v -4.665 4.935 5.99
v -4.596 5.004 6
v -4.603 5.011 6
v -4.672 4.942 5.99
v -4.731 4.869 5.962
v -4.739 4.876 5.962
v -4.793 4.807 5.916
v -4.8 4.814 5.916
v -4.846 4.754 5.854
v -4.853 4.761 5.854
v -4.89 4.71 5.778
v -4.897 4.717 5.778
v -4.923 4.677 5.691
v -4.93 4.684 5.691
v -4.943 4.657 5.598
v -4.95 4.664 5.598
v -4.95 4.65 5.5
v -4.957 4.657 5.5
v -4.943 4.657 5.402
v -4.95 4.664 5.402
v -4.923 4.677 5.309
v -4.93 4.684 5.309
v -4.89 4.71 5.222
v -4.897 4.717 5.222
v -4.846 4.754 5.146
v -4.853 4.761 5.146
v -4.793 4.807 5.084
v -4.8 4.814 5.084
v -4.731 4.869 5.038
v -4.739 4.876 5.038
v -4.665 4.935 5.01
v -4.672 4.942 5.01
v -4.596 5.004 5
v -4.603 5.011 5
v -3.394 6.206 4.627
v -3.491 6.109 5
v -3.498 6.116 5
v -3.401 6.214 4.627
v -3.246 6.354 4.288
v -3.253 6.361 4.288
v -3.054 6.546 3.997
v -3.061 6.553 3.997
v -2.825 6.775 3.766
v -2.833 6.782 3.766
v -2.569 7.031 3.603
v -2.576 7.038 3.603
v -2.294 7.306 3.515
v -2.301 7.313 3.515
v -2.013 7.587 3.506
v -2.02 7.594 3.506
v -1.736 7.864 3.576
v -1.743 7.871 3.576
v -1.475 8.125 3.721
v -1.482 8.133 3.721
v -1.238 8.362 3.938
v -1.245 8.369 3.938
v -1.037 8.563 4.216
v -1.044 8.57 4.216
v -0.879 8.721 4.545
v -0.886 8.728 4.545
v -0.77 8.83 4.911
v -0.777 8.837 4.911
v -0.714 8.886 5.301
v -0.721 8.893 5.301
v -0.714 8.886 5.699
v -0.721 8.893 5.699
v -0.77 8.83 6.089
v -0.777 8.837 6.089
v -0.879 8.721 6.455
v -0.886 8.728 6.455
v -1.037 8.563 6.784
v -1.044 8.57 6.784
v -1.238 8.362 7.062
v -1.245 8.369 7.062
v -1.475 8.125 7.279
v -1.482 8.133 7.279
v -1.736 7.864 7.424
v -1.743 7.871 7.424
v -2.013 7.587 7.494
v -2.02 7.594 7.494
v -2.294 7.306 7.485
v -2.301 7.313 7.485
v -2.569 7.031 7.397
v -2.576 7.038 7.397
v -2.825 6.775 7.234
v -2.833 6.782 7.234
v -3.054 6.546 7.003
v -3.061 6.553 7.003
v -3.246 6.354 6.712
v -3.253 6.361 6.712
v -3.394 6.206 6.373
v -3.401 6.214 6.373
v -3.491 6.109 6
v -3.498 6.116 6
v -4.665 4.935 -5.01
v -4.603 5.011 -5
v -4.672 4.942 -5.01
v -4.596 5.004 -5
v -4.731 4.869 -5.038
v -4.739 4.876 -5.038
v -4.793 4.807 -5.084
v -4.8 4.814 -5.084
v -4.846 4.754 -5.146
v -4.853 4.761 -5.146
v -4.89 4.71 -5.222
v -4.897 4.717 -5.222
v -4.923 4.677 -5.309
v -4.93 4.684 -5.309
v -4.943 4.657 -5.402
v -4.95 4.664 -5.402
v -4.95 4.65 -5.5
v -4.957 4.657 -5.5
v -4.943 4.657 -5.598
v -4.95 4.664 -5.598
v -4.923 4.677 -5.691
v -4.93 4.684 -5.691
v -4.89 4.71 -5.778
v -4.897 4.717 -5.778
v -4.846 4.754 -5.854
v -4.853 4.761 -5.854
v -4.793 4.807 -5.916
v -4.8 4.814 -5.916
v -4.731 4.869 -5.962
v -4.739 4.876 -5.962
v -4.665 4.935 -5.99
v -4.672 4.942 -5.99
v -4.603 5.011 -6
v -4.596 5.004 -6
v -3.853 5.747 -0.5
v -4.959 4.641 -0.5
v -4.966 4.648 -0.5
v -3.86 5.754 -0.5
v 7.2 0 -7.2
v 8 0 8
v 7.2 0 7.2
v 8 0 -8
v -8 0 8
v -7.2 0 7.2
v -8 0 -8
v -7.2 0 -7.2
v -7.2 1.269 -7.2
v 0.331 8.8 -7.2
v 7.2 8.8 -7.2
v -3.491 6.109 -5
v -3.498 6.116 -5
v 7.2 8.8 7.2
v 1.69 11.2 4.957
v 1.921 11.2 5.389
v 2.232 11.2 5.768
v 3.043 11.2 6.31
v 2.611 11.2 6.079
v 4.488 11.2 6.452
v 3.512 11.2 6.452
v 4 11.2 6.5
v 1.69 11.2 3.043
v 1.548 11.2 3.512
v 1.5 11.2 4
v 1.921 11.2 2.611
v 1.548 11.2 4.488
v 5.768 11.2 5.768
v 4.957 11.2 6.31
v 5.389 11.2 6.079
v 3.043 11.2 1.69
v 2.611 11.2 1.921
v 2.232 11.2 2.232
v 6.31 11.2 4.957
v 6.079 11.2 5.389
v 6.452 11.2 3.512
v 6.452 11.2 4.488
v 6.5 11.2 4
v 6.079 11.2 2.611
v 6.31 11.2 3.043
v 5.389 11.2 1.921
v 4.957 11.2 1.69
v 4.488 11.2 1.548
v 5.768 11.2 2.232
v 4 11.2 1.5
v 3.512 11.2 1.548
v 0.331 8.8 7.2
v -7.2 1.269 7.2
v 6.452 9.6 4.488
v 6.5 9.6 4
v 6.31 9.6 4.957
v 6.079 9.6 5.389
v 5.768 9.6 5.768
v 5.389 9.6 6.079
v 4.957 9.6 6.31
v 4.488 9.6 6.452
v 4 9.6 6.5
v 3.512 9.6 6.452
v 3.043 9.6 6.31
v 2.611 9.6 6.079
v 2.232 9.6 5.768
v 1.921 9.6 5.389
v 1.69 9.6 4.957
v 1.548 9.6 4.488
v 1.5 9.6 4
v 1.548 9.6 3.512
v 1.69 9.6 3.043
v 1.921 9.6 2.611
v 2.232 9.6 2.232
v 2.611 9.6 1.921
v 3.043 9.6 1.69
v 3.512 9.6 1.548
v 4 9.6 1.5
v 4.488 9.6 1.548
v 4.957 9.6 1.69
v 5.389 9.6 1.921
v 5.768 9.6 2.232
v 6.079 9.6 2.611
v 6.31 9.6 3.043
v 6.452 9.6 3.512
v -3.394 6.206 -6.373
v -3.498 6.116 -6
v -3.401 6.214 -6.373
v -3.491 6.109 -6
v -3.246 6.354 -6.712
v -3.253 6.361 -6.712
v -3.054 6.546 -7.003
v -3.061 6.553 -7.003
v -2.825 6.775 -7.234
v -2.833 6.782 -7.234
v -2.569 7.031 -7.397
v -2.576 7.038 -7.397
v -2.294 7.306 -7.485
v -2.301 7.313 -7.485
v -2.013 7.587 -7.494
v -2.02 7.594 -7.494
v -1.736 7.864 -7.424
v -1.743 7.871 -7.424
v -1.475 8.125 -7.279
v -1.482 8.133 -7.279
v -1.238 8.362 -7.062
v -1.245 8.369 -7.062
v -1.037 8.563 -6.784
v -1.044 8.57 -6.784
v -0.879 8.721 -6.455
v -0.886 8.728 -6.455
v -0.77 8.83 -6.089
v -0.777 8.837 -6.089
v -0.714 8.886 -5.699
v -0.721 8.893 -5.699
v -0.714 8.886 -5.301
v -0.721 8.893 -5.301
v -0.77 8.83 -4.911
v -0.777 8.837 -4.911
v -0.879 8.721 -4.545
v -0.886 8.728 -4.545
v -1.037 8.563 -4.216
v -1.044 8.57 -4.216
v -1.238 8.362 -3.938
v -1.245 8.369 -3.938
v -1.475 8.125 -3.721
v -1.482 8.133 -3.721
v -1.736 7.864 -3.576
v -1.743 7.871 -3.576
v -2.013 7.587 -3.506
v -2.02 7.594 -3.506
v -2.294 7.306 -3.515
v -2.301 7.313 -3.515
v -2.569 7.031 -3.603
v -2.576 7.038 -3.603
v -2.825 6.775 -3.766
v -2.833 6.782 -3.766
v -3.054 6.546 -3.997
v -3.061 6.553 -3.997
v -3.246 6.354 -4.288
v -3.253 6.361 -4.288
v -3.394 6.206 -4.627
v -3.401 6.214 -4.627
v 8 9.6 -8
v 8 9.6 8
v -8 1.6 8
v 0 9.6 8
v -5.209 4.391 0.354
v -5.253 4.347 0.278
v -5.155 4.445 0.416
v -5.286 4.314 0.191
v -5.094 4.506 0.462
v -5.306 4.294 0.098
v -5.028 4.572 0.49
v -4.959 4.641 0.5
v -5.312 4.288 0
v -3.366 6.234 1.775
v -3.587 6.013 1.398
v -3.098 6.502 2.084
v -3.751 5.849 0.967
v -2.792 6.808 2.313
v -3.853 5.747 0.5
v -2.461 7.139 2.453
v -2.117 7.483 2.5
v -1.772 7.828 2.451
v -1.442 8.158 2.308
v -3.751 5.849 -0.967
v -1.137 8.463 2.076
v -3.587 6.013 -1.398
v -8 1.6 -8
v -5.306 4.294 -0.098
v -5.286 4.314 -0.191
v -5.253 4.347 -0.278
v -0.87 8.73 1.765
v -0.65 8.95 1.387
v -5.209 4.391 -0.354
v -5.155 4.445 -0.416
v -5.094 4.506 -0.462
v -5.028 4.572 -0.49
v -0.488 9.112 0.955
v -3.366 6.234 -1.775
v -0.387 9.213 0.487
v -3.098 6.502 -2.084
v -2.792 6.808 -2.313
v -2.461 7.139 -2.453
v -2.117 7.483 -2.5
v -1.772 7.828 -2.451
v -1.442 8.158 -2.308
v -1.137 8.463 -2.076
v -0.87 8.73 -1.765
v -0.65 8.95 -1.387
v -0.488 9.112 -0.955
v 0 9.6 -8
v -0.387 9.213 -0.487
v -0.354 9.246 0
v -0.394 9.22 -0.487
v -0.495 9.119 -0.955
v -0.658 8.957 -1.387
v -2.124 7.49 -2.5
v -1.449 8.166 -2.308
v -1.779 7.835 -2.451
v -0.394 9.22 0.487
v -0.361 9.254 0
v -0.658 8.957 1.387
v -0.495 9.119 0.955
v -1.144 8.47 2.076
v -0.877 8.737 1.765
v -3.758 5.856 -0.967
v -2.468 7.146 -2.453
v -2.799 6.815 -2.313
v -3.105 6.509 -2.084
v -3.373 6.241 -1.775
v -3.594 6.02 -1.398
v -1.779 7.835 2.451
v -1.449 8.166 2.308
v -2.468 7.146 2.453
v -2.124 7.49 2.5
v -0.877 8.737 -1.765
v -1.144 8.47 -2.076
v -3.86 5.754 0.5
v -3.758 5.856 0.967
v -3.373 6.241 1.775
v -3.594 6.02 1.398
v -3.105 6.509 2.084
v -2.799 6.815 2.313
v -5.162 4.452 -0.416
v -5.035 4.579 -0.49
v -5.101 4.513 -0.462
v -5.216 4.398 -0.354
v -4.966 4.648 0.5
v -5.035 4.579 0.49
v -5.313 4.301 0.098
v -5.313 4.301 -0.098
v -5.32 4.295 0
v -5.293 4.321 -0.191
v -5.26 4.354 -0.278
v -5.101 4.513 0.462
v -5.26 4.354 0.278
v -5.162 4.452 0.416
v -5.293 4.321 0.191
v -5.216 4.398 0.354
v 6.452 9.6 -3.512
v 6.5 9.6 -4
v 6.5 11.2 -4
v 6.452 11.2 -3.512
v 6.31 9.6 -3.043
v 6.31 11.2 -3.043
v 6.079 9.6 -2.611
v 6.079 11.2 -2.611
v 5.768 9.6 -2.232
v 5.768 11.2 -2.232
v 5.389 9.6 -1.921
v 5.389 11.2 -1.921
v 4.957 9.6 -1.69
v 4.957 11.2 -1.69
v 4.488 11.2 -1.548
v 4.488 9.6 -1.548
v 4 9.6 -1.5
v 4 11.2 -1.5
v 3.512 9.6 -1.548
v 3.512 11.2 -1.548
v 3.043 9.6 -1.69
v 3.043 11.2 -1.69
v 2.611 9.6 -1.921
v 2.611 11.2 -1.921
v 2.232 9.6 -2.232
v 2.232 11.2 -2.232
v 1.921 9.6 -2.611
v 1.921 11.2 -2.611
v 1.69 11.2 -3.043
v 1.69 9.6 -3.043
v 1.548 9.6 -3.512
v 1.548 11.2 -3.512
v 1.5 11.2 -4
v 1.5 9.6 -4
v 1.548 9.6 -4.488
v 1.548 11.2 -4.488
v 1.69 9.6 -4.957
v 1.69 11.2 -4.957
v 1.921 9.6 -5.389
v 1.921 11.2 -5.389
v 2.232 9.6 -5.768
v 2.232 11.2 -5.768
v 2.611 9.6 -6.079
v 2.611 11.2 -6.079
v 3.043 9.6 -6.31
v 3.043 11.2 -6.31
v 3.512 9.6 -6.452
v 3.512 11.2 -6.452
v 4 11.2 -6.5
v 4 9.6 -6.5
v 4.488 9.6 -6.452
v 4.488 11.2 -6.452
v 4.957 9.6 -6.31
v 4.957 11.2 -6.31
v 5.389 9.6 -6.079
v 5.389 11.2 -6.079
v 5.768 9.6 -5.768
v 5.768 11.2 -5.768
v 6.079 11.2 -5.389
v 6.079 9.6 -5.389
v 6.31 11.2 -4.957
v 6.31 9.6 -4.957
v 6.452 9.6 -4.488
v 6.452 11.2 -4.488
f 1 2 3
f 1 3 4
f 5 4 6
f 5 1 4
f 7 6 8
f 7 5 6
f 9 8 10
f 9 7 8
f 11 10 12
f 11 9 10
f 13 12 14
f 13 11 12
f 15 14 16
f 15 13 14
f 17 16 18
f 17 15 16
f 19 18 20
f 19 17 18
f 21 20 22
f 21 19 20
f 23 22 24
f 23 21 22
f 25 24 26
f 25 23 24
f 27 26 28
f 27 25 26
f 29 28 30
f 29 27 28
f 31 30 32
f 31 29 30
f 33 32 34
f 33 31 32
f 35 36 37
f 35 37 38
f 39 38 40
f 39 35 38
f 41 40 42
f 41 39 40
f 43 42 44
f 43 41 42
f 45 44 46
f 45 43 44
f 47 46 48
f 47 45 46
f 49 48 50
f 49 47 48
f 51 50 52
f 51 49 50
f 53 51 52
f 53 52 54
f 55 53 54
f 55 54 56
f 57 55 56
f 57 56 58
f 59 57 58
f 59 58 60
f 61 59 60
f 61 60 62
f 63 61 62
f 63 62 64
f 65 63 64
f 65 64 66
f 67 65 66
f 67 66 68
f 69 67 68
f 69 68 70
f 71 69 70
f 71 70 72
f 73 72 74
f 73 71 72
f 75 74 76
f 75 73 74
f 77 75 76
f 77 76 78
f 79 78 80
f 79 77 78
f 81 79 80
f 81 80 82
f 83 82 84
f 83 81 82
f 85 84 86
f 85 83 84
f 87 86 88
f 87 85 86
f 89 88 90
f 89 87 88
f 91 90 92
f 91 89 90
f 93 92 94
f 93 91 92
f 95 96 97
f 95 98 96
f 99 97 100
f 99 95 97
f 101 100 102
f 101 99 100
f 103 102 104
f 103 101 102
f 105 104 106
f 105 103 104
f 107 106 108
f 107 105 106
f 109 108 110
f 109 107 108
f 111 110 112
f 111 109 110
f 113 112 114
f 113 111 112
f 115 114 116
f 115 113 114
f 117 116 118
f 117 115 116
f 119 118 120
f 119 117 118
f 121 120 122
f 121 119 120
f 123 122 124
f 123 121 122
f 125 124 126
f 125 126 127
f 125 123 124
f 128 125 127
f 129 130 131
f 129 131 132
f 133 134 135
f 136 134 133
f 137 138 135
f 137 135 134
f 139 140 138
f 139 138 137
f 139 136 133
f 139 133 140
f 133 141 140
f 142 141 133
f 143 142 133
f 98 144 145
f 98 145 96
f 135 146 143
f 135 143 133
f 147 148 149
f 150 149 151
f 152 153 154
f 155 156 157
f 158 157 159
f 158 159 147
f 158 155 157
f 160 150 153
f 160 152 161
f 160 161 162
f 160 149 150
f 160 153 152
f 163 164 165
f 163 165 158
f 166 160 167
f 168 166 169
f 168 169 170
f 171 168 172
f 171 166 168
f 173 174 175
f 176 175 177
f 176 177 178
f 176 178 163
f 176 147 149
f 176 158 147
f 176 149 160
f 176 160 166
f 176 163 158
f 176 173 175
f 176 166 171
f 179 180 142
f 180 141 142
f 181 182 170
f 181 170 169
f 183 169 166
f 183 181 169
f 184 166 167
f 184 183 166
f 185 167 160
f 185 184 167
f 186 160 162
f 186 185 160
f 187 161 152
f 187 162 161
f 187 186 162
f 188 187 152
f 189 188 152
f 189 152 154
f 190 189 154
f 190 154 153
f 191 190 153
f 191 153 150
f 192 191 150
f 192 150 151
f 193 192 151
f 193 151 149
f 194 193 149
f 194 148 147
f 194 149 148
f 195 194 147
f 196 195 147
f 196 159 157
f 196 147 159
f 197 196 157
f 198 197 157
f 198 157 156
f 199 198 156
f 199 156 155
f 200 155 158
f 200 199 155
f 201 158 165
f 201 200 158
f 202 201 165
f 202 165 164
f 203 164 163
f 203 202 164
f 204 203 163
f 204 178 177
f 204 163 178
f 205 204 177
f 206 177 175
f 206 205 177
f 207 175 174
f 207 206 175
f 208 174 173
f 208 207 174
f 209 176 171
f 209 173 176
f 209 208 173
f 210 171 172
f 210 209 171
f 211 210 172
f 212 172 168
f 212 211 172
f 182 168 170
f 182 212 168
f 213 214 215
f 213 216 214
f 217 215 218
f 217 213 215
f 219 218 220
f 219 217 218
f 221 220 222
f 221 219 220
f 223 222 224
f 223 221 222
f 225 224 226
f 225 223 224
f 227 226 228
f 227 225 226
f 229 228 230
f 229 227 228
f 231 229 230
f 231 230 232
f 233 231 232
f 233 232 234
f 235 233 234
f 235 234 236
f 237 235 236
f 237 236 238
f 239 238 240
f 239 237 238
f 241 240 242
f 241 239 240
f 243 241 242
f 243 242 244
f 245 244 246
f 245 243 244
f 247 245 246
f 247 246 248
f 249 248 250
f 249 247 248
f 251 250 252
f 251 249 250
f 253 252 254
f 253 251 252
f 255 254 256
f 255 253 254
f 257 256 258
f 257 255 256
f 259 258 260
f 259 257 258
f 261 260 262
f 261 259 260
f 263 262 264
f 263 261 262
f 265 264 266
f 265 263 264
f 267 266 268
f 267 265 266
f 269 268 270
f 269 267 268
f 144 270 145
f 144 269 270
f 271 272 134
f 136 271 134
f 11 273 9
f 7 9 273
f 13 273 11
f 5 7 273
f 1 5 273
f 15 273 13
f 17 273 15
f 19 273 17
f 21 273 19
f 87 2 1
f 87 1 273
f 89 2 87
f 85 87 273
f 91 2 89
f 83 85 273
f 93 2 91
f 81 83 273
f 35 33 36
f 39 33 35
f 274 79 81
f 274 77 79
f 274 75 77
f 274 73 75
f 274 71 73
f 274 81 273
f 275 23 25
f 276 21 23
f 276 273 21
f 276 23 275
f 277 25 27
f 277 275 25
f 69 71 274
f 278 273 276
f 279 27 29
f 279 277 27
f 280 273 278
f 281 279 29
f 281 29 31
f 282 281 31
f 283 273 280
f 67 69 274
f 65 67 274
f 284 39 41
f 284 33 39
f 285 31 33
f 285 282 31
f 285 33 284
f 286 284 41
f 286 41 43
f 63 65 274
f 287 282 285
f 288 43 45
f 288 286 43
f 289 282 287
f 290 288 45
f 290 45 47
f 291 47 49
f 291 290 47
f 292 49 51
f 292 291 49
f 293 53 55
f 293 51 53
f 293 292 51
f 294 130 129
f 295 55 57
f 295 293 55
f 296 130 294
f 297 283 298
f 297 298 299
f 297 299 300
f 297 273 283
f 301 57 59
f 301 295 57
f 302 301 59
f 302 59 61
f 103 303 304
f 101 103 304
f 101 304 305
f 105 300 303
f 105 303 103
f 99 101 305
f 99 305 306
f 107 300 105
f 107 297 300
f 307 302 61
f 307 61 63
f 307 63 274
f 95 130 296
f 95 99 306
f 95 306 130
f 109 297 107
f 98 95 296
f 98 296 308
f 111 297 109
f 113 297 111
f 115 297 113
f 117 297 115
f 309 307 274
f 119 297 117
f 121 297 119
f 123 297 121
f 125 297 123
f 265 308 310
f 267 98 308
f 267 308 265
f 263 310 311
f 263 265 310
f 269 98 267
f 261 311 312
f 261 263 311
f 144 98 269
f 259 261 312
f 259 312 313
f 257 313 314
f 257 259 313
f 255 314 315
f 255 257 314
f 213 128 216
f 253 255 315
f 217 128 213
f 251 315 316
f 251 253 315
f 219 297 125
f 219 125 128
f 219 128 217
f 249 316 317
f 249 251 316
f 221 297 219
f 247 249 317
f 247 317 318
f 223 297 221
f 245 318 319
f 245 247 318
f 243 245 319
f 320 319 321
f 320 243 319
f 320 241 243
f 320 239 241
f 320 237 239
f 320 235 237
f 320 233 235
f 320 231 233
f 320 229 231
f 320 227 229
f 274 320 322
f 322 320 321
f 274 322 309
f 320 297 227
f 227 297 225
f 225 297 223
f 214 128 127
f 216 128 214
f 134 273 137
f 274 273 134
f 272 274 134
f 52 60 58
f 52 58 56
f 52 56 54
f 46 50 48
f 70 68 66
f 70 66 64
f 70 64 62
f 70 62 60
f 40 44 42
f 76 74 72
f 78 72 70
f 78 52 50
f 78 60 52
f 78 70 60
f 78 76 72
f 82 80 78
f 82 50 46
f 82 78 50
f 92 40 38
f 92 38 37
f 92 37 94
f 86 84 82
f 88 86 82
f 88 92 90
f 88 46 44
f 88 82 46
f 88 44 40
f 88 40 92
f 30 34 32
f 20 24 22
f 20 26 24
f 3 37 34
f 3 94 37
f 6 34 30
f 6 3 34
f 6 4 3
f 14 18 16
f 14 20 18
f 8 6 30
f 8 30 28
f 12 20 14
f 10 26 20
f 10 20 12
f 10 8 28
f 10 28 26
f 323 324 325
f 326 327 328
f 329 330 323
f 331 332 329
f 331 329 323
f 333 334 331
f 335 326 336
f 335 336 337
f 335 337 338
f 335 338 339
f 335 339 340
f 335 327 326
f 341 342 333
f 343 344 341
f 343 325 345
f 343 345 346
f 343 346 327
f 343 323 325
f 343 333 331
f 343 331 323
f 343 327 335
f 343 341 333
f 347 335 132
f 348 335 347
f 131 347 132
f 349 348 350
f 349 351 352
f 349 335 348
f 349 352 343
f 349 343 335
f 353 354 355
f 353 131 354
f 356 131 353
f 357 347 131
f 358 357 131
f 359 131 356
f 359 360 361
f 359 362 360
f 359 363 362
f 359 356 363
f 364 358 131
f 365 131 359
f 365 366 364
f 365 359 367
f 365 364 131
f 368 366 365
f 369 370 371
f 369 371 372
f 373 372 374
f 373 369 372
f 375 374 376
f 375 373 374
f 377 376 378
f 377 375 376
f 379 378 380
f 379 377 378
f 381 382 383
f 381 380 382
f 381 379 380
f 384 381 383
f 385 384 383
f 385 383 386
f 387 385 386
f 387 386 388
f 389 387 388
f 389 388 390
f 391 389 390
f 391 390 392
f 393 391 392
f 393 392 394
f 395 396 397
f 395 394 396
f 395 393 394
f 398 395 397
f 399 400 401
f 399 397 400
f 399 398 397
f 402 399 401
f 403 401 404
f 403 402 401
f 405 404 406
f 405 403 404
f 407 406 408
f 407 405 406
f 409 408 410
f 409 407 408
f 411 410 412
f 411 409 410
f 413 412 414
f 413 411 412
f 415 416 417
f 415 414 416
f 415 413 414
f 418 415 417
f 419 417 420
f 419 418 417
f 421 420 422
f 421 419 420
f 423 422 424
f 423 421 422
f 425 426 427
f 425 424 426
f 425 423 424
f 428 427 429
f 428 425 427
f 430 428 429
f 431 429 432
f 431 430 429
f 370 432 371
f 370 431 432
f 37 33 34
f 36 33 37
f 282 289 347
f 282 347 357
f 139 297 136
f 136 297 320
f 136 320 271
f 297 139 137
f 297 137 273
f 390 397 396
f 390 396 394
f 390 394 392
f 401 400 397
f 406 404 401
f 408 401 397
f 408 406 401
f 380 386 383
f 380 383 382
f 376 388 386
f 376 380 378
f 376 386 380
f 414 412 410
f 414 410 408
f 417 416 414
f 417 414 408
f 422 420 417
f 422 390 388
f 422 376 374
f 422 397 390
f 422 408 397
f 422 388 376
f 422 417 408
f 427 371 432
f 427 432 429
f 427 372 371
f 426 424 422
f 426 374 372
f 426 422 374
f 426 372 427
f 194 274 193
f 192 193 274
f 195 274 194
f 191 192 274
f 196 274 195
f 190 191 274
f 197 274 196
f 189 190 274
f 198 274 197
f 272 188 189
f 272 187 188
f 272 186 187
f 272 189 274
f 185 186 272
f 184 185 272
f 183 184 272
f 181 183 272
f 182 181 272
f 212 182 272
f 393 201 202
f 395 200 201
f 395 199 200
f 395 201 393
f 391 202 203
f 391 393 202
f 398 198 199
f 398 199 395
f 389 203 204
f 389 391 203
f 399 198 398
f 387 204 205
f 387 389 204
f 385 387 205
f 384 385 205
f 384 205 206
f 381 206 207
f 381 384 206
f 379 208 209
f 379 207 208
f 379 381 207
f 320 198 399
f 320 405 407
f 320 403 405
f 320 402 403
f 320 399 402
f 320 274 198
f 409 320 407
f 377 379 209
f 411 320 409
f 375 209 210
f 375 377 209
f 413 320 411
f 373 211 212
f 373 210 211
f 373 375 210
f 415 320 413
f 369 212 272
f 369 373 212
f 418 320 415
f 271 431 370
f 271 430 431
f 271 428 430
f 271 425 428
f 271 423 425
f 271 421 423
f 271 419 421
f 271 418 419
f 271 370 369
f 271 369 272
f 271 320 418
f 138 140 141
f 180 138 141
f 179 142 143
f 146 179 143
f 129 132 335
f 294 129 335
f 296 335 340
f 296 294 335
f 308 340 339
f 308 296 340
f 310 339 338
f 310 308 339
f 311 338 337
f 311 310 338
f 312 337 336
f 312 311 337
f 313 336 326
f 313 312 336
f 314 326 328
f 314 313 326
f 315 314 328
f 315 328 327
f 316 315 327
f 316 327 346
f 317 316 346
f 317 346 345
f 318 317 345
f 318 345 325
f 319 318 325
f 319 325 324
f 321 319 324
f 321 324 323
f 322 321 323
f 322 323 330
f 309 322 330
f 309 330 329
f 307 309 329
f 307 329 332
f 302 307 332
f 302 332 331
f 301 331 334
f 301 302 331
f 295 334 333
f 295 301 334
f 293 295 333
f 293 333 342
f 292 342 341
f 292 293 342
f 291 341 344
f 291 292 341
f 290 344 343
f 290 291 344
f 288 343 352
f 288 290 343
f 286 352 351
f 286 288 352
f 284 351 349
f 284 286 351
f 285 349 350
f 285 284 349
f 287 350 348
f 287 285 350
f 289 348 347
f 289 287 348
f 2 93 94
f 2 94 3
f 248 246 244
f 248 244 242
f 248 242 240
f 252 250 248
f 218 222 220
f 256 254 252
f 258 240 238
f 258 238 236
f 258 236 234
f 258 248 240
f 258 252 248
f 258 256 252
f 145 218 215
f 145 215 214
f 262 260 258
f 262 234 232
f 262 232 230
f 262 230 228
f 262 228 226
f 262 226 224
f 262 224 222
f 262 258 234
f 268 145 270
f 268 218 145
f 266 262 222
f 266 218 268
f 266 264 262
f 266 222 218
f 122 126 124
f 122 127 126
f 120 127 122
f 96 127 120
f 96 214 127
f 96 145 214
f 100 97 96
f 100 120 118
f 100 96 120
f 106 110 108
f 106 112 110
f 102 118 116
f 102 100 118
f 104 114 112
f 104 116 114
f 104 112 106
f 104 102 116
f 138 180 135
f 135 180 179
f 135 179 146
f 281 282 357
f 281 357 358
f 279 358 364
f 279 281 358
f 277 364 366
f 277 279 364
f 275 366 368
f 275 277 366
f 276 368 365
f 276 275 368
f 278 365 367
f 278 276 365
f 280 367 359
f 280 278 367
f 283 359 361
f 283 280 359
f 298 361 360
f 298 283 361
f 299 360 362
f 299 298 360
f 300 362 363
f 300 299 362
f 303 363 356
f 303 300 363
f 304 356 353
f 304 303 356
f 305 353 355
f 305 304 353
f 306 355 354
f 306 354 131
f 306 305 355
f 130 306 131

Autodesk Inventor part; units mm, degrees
ref_plane "YZ Plane" through (0, 0, 0) normal (1, 0, 0) x (0, 1, 0)
ref_plane "XZ Plane" through (0, 0, 0) normal (0, 1, 0) x (-1, 0, 0)
ref_plane "XY Plane" through (0, 0, 0) normal (0, 0, 1) x (1, 0, 0)
sketch "Sketch1" plane through (0, 0, 0) normal (0, 0, 1) x (1, 0, 0)
  line L0 (8, 0) -> (-8, 0)
  line L1 (-8, 0) -> (-8, 1.6)
  line L2 (-8, 1.6) -> (0, 9.6)
  line L3 (0, 9.6) -> (8, 9.6)
  line L4 (8, 9.6) -> (8, 0)
  point P0 (0, 0)
  point P1 (0, 0)
  dimension "d0" = 9.6
  dimension "d1" = 16
  dimension "d2" = 8
  dimension "d3" = 1.6
extrude "Extrusion1" add sketch "Sketch1" along normal mid plane 16
shell "Shell1" thickness 0.8 removed faces 1 at (-2.6667, 0, 2.6667)
sketch "Sketch2" plane through (0, 9.6, 8) normal (0, 1, 0) x (1, 0, 0)
  line L0 (4, 12) -> (4, 4) construction
  line L1 (-11.2, 8) -> (11.2, 8) construction
  line L2 (8, 0) -> (8, 16) construction
  circle A0 centre (4, 12) radius 2.5
  circle A1 centre (4, 4) radius 2.5
  point P0 (4, 8)
  dimension "d6" = 4
  dimension "d7" = 8
  dimension "d8" = 5
extrude "Extrusion2" add sketch "Sketch2" along normal blind 1.6
sketch "Sketch3" plane through (0, 9.6, -8) normal (-0.7071, 0.7071, 0) x (-0.7071, -0.7071, 0)
  line L0 (11.3137, 16) -> (0, 16) projected
  line L1 (0, 16) -> (0, 0) projected
  line L2 (0, 0) -> (11.3137, 0) projected
  circle A0 centre (3, 2.5) radius 2
  circle A1 centre (3, 8) radius 2.5
  circle A2 centre (3, 13.5) radius 2
  line L3 (4.9365, 14) -> (6.5, 14)
  line L4 (7, 13.5) -> (7, 13.5)
  line L5 (6.5, 13) -> (4.9365, 13)
  line L6 (4.9365, 13) -> (4.9365, 14)
  line L7 (5.4495, 8.5) -> (7.013, 8.5)
  line L8 (7.513, 8) -> (7.513, 8)
  line L9 (7.013, 7.5) -> (5.4495, 7.5)
  line L10 (5.4495, 7.5) -> (5.4495, 8.5)
  line L11 (4.9365, 3) -> (6.5, 3)
  line L12 (7, 2.5) -> (7, 2.5)
  line L13 (6.5, 2) -> (4.9365, 2)
  line L14 (4.9365, 2) -> (4.9365, 3)
  arc A3 (6.5, 2) -> (7, 2.5) centre (6.5, 2.5) ccw
  arc A4 (7, 2.5) -> (6.5, 3) centre (6.5, 2.5) ccw
  arc A5 (7.013, 7.5) -> (7.513, 8) centre (7.013, 8) ccw
  arc A6 (7.513, 8) -> (7.013, 8.5) centre (7.013, 8) ccw
  arc A7 (6.5, 13) -> (7, 13.5) centre (6.5, 13.5) ccw
  arc A8 (7, 13.5) -> (6.5, 14) centre (6.5, 13.5) ccw
  point P0 (6.7882, 8)
  dimension "d12" = 4
  dimension "d13" = 5
  dimension "d14" = 4
  dimension "d15" = 5.5
  dimension "d16" = 5.5
  dimension "d17" = 2.5
  dimension "d18" = 2.5
  dimension "d19" = 3
  dimension "d20" = 0.5
  dimension "d21" = 1
  dimension "d22" = 3.5
extrude "Extrusion3" add sketch "Sketch3" along normal blind 0.01
equation "\"d14\" = d12"
equation "\"d16\" = d15"
equation "\"d17\" = d18"
properties part number "3039pc4" material "Steel"
